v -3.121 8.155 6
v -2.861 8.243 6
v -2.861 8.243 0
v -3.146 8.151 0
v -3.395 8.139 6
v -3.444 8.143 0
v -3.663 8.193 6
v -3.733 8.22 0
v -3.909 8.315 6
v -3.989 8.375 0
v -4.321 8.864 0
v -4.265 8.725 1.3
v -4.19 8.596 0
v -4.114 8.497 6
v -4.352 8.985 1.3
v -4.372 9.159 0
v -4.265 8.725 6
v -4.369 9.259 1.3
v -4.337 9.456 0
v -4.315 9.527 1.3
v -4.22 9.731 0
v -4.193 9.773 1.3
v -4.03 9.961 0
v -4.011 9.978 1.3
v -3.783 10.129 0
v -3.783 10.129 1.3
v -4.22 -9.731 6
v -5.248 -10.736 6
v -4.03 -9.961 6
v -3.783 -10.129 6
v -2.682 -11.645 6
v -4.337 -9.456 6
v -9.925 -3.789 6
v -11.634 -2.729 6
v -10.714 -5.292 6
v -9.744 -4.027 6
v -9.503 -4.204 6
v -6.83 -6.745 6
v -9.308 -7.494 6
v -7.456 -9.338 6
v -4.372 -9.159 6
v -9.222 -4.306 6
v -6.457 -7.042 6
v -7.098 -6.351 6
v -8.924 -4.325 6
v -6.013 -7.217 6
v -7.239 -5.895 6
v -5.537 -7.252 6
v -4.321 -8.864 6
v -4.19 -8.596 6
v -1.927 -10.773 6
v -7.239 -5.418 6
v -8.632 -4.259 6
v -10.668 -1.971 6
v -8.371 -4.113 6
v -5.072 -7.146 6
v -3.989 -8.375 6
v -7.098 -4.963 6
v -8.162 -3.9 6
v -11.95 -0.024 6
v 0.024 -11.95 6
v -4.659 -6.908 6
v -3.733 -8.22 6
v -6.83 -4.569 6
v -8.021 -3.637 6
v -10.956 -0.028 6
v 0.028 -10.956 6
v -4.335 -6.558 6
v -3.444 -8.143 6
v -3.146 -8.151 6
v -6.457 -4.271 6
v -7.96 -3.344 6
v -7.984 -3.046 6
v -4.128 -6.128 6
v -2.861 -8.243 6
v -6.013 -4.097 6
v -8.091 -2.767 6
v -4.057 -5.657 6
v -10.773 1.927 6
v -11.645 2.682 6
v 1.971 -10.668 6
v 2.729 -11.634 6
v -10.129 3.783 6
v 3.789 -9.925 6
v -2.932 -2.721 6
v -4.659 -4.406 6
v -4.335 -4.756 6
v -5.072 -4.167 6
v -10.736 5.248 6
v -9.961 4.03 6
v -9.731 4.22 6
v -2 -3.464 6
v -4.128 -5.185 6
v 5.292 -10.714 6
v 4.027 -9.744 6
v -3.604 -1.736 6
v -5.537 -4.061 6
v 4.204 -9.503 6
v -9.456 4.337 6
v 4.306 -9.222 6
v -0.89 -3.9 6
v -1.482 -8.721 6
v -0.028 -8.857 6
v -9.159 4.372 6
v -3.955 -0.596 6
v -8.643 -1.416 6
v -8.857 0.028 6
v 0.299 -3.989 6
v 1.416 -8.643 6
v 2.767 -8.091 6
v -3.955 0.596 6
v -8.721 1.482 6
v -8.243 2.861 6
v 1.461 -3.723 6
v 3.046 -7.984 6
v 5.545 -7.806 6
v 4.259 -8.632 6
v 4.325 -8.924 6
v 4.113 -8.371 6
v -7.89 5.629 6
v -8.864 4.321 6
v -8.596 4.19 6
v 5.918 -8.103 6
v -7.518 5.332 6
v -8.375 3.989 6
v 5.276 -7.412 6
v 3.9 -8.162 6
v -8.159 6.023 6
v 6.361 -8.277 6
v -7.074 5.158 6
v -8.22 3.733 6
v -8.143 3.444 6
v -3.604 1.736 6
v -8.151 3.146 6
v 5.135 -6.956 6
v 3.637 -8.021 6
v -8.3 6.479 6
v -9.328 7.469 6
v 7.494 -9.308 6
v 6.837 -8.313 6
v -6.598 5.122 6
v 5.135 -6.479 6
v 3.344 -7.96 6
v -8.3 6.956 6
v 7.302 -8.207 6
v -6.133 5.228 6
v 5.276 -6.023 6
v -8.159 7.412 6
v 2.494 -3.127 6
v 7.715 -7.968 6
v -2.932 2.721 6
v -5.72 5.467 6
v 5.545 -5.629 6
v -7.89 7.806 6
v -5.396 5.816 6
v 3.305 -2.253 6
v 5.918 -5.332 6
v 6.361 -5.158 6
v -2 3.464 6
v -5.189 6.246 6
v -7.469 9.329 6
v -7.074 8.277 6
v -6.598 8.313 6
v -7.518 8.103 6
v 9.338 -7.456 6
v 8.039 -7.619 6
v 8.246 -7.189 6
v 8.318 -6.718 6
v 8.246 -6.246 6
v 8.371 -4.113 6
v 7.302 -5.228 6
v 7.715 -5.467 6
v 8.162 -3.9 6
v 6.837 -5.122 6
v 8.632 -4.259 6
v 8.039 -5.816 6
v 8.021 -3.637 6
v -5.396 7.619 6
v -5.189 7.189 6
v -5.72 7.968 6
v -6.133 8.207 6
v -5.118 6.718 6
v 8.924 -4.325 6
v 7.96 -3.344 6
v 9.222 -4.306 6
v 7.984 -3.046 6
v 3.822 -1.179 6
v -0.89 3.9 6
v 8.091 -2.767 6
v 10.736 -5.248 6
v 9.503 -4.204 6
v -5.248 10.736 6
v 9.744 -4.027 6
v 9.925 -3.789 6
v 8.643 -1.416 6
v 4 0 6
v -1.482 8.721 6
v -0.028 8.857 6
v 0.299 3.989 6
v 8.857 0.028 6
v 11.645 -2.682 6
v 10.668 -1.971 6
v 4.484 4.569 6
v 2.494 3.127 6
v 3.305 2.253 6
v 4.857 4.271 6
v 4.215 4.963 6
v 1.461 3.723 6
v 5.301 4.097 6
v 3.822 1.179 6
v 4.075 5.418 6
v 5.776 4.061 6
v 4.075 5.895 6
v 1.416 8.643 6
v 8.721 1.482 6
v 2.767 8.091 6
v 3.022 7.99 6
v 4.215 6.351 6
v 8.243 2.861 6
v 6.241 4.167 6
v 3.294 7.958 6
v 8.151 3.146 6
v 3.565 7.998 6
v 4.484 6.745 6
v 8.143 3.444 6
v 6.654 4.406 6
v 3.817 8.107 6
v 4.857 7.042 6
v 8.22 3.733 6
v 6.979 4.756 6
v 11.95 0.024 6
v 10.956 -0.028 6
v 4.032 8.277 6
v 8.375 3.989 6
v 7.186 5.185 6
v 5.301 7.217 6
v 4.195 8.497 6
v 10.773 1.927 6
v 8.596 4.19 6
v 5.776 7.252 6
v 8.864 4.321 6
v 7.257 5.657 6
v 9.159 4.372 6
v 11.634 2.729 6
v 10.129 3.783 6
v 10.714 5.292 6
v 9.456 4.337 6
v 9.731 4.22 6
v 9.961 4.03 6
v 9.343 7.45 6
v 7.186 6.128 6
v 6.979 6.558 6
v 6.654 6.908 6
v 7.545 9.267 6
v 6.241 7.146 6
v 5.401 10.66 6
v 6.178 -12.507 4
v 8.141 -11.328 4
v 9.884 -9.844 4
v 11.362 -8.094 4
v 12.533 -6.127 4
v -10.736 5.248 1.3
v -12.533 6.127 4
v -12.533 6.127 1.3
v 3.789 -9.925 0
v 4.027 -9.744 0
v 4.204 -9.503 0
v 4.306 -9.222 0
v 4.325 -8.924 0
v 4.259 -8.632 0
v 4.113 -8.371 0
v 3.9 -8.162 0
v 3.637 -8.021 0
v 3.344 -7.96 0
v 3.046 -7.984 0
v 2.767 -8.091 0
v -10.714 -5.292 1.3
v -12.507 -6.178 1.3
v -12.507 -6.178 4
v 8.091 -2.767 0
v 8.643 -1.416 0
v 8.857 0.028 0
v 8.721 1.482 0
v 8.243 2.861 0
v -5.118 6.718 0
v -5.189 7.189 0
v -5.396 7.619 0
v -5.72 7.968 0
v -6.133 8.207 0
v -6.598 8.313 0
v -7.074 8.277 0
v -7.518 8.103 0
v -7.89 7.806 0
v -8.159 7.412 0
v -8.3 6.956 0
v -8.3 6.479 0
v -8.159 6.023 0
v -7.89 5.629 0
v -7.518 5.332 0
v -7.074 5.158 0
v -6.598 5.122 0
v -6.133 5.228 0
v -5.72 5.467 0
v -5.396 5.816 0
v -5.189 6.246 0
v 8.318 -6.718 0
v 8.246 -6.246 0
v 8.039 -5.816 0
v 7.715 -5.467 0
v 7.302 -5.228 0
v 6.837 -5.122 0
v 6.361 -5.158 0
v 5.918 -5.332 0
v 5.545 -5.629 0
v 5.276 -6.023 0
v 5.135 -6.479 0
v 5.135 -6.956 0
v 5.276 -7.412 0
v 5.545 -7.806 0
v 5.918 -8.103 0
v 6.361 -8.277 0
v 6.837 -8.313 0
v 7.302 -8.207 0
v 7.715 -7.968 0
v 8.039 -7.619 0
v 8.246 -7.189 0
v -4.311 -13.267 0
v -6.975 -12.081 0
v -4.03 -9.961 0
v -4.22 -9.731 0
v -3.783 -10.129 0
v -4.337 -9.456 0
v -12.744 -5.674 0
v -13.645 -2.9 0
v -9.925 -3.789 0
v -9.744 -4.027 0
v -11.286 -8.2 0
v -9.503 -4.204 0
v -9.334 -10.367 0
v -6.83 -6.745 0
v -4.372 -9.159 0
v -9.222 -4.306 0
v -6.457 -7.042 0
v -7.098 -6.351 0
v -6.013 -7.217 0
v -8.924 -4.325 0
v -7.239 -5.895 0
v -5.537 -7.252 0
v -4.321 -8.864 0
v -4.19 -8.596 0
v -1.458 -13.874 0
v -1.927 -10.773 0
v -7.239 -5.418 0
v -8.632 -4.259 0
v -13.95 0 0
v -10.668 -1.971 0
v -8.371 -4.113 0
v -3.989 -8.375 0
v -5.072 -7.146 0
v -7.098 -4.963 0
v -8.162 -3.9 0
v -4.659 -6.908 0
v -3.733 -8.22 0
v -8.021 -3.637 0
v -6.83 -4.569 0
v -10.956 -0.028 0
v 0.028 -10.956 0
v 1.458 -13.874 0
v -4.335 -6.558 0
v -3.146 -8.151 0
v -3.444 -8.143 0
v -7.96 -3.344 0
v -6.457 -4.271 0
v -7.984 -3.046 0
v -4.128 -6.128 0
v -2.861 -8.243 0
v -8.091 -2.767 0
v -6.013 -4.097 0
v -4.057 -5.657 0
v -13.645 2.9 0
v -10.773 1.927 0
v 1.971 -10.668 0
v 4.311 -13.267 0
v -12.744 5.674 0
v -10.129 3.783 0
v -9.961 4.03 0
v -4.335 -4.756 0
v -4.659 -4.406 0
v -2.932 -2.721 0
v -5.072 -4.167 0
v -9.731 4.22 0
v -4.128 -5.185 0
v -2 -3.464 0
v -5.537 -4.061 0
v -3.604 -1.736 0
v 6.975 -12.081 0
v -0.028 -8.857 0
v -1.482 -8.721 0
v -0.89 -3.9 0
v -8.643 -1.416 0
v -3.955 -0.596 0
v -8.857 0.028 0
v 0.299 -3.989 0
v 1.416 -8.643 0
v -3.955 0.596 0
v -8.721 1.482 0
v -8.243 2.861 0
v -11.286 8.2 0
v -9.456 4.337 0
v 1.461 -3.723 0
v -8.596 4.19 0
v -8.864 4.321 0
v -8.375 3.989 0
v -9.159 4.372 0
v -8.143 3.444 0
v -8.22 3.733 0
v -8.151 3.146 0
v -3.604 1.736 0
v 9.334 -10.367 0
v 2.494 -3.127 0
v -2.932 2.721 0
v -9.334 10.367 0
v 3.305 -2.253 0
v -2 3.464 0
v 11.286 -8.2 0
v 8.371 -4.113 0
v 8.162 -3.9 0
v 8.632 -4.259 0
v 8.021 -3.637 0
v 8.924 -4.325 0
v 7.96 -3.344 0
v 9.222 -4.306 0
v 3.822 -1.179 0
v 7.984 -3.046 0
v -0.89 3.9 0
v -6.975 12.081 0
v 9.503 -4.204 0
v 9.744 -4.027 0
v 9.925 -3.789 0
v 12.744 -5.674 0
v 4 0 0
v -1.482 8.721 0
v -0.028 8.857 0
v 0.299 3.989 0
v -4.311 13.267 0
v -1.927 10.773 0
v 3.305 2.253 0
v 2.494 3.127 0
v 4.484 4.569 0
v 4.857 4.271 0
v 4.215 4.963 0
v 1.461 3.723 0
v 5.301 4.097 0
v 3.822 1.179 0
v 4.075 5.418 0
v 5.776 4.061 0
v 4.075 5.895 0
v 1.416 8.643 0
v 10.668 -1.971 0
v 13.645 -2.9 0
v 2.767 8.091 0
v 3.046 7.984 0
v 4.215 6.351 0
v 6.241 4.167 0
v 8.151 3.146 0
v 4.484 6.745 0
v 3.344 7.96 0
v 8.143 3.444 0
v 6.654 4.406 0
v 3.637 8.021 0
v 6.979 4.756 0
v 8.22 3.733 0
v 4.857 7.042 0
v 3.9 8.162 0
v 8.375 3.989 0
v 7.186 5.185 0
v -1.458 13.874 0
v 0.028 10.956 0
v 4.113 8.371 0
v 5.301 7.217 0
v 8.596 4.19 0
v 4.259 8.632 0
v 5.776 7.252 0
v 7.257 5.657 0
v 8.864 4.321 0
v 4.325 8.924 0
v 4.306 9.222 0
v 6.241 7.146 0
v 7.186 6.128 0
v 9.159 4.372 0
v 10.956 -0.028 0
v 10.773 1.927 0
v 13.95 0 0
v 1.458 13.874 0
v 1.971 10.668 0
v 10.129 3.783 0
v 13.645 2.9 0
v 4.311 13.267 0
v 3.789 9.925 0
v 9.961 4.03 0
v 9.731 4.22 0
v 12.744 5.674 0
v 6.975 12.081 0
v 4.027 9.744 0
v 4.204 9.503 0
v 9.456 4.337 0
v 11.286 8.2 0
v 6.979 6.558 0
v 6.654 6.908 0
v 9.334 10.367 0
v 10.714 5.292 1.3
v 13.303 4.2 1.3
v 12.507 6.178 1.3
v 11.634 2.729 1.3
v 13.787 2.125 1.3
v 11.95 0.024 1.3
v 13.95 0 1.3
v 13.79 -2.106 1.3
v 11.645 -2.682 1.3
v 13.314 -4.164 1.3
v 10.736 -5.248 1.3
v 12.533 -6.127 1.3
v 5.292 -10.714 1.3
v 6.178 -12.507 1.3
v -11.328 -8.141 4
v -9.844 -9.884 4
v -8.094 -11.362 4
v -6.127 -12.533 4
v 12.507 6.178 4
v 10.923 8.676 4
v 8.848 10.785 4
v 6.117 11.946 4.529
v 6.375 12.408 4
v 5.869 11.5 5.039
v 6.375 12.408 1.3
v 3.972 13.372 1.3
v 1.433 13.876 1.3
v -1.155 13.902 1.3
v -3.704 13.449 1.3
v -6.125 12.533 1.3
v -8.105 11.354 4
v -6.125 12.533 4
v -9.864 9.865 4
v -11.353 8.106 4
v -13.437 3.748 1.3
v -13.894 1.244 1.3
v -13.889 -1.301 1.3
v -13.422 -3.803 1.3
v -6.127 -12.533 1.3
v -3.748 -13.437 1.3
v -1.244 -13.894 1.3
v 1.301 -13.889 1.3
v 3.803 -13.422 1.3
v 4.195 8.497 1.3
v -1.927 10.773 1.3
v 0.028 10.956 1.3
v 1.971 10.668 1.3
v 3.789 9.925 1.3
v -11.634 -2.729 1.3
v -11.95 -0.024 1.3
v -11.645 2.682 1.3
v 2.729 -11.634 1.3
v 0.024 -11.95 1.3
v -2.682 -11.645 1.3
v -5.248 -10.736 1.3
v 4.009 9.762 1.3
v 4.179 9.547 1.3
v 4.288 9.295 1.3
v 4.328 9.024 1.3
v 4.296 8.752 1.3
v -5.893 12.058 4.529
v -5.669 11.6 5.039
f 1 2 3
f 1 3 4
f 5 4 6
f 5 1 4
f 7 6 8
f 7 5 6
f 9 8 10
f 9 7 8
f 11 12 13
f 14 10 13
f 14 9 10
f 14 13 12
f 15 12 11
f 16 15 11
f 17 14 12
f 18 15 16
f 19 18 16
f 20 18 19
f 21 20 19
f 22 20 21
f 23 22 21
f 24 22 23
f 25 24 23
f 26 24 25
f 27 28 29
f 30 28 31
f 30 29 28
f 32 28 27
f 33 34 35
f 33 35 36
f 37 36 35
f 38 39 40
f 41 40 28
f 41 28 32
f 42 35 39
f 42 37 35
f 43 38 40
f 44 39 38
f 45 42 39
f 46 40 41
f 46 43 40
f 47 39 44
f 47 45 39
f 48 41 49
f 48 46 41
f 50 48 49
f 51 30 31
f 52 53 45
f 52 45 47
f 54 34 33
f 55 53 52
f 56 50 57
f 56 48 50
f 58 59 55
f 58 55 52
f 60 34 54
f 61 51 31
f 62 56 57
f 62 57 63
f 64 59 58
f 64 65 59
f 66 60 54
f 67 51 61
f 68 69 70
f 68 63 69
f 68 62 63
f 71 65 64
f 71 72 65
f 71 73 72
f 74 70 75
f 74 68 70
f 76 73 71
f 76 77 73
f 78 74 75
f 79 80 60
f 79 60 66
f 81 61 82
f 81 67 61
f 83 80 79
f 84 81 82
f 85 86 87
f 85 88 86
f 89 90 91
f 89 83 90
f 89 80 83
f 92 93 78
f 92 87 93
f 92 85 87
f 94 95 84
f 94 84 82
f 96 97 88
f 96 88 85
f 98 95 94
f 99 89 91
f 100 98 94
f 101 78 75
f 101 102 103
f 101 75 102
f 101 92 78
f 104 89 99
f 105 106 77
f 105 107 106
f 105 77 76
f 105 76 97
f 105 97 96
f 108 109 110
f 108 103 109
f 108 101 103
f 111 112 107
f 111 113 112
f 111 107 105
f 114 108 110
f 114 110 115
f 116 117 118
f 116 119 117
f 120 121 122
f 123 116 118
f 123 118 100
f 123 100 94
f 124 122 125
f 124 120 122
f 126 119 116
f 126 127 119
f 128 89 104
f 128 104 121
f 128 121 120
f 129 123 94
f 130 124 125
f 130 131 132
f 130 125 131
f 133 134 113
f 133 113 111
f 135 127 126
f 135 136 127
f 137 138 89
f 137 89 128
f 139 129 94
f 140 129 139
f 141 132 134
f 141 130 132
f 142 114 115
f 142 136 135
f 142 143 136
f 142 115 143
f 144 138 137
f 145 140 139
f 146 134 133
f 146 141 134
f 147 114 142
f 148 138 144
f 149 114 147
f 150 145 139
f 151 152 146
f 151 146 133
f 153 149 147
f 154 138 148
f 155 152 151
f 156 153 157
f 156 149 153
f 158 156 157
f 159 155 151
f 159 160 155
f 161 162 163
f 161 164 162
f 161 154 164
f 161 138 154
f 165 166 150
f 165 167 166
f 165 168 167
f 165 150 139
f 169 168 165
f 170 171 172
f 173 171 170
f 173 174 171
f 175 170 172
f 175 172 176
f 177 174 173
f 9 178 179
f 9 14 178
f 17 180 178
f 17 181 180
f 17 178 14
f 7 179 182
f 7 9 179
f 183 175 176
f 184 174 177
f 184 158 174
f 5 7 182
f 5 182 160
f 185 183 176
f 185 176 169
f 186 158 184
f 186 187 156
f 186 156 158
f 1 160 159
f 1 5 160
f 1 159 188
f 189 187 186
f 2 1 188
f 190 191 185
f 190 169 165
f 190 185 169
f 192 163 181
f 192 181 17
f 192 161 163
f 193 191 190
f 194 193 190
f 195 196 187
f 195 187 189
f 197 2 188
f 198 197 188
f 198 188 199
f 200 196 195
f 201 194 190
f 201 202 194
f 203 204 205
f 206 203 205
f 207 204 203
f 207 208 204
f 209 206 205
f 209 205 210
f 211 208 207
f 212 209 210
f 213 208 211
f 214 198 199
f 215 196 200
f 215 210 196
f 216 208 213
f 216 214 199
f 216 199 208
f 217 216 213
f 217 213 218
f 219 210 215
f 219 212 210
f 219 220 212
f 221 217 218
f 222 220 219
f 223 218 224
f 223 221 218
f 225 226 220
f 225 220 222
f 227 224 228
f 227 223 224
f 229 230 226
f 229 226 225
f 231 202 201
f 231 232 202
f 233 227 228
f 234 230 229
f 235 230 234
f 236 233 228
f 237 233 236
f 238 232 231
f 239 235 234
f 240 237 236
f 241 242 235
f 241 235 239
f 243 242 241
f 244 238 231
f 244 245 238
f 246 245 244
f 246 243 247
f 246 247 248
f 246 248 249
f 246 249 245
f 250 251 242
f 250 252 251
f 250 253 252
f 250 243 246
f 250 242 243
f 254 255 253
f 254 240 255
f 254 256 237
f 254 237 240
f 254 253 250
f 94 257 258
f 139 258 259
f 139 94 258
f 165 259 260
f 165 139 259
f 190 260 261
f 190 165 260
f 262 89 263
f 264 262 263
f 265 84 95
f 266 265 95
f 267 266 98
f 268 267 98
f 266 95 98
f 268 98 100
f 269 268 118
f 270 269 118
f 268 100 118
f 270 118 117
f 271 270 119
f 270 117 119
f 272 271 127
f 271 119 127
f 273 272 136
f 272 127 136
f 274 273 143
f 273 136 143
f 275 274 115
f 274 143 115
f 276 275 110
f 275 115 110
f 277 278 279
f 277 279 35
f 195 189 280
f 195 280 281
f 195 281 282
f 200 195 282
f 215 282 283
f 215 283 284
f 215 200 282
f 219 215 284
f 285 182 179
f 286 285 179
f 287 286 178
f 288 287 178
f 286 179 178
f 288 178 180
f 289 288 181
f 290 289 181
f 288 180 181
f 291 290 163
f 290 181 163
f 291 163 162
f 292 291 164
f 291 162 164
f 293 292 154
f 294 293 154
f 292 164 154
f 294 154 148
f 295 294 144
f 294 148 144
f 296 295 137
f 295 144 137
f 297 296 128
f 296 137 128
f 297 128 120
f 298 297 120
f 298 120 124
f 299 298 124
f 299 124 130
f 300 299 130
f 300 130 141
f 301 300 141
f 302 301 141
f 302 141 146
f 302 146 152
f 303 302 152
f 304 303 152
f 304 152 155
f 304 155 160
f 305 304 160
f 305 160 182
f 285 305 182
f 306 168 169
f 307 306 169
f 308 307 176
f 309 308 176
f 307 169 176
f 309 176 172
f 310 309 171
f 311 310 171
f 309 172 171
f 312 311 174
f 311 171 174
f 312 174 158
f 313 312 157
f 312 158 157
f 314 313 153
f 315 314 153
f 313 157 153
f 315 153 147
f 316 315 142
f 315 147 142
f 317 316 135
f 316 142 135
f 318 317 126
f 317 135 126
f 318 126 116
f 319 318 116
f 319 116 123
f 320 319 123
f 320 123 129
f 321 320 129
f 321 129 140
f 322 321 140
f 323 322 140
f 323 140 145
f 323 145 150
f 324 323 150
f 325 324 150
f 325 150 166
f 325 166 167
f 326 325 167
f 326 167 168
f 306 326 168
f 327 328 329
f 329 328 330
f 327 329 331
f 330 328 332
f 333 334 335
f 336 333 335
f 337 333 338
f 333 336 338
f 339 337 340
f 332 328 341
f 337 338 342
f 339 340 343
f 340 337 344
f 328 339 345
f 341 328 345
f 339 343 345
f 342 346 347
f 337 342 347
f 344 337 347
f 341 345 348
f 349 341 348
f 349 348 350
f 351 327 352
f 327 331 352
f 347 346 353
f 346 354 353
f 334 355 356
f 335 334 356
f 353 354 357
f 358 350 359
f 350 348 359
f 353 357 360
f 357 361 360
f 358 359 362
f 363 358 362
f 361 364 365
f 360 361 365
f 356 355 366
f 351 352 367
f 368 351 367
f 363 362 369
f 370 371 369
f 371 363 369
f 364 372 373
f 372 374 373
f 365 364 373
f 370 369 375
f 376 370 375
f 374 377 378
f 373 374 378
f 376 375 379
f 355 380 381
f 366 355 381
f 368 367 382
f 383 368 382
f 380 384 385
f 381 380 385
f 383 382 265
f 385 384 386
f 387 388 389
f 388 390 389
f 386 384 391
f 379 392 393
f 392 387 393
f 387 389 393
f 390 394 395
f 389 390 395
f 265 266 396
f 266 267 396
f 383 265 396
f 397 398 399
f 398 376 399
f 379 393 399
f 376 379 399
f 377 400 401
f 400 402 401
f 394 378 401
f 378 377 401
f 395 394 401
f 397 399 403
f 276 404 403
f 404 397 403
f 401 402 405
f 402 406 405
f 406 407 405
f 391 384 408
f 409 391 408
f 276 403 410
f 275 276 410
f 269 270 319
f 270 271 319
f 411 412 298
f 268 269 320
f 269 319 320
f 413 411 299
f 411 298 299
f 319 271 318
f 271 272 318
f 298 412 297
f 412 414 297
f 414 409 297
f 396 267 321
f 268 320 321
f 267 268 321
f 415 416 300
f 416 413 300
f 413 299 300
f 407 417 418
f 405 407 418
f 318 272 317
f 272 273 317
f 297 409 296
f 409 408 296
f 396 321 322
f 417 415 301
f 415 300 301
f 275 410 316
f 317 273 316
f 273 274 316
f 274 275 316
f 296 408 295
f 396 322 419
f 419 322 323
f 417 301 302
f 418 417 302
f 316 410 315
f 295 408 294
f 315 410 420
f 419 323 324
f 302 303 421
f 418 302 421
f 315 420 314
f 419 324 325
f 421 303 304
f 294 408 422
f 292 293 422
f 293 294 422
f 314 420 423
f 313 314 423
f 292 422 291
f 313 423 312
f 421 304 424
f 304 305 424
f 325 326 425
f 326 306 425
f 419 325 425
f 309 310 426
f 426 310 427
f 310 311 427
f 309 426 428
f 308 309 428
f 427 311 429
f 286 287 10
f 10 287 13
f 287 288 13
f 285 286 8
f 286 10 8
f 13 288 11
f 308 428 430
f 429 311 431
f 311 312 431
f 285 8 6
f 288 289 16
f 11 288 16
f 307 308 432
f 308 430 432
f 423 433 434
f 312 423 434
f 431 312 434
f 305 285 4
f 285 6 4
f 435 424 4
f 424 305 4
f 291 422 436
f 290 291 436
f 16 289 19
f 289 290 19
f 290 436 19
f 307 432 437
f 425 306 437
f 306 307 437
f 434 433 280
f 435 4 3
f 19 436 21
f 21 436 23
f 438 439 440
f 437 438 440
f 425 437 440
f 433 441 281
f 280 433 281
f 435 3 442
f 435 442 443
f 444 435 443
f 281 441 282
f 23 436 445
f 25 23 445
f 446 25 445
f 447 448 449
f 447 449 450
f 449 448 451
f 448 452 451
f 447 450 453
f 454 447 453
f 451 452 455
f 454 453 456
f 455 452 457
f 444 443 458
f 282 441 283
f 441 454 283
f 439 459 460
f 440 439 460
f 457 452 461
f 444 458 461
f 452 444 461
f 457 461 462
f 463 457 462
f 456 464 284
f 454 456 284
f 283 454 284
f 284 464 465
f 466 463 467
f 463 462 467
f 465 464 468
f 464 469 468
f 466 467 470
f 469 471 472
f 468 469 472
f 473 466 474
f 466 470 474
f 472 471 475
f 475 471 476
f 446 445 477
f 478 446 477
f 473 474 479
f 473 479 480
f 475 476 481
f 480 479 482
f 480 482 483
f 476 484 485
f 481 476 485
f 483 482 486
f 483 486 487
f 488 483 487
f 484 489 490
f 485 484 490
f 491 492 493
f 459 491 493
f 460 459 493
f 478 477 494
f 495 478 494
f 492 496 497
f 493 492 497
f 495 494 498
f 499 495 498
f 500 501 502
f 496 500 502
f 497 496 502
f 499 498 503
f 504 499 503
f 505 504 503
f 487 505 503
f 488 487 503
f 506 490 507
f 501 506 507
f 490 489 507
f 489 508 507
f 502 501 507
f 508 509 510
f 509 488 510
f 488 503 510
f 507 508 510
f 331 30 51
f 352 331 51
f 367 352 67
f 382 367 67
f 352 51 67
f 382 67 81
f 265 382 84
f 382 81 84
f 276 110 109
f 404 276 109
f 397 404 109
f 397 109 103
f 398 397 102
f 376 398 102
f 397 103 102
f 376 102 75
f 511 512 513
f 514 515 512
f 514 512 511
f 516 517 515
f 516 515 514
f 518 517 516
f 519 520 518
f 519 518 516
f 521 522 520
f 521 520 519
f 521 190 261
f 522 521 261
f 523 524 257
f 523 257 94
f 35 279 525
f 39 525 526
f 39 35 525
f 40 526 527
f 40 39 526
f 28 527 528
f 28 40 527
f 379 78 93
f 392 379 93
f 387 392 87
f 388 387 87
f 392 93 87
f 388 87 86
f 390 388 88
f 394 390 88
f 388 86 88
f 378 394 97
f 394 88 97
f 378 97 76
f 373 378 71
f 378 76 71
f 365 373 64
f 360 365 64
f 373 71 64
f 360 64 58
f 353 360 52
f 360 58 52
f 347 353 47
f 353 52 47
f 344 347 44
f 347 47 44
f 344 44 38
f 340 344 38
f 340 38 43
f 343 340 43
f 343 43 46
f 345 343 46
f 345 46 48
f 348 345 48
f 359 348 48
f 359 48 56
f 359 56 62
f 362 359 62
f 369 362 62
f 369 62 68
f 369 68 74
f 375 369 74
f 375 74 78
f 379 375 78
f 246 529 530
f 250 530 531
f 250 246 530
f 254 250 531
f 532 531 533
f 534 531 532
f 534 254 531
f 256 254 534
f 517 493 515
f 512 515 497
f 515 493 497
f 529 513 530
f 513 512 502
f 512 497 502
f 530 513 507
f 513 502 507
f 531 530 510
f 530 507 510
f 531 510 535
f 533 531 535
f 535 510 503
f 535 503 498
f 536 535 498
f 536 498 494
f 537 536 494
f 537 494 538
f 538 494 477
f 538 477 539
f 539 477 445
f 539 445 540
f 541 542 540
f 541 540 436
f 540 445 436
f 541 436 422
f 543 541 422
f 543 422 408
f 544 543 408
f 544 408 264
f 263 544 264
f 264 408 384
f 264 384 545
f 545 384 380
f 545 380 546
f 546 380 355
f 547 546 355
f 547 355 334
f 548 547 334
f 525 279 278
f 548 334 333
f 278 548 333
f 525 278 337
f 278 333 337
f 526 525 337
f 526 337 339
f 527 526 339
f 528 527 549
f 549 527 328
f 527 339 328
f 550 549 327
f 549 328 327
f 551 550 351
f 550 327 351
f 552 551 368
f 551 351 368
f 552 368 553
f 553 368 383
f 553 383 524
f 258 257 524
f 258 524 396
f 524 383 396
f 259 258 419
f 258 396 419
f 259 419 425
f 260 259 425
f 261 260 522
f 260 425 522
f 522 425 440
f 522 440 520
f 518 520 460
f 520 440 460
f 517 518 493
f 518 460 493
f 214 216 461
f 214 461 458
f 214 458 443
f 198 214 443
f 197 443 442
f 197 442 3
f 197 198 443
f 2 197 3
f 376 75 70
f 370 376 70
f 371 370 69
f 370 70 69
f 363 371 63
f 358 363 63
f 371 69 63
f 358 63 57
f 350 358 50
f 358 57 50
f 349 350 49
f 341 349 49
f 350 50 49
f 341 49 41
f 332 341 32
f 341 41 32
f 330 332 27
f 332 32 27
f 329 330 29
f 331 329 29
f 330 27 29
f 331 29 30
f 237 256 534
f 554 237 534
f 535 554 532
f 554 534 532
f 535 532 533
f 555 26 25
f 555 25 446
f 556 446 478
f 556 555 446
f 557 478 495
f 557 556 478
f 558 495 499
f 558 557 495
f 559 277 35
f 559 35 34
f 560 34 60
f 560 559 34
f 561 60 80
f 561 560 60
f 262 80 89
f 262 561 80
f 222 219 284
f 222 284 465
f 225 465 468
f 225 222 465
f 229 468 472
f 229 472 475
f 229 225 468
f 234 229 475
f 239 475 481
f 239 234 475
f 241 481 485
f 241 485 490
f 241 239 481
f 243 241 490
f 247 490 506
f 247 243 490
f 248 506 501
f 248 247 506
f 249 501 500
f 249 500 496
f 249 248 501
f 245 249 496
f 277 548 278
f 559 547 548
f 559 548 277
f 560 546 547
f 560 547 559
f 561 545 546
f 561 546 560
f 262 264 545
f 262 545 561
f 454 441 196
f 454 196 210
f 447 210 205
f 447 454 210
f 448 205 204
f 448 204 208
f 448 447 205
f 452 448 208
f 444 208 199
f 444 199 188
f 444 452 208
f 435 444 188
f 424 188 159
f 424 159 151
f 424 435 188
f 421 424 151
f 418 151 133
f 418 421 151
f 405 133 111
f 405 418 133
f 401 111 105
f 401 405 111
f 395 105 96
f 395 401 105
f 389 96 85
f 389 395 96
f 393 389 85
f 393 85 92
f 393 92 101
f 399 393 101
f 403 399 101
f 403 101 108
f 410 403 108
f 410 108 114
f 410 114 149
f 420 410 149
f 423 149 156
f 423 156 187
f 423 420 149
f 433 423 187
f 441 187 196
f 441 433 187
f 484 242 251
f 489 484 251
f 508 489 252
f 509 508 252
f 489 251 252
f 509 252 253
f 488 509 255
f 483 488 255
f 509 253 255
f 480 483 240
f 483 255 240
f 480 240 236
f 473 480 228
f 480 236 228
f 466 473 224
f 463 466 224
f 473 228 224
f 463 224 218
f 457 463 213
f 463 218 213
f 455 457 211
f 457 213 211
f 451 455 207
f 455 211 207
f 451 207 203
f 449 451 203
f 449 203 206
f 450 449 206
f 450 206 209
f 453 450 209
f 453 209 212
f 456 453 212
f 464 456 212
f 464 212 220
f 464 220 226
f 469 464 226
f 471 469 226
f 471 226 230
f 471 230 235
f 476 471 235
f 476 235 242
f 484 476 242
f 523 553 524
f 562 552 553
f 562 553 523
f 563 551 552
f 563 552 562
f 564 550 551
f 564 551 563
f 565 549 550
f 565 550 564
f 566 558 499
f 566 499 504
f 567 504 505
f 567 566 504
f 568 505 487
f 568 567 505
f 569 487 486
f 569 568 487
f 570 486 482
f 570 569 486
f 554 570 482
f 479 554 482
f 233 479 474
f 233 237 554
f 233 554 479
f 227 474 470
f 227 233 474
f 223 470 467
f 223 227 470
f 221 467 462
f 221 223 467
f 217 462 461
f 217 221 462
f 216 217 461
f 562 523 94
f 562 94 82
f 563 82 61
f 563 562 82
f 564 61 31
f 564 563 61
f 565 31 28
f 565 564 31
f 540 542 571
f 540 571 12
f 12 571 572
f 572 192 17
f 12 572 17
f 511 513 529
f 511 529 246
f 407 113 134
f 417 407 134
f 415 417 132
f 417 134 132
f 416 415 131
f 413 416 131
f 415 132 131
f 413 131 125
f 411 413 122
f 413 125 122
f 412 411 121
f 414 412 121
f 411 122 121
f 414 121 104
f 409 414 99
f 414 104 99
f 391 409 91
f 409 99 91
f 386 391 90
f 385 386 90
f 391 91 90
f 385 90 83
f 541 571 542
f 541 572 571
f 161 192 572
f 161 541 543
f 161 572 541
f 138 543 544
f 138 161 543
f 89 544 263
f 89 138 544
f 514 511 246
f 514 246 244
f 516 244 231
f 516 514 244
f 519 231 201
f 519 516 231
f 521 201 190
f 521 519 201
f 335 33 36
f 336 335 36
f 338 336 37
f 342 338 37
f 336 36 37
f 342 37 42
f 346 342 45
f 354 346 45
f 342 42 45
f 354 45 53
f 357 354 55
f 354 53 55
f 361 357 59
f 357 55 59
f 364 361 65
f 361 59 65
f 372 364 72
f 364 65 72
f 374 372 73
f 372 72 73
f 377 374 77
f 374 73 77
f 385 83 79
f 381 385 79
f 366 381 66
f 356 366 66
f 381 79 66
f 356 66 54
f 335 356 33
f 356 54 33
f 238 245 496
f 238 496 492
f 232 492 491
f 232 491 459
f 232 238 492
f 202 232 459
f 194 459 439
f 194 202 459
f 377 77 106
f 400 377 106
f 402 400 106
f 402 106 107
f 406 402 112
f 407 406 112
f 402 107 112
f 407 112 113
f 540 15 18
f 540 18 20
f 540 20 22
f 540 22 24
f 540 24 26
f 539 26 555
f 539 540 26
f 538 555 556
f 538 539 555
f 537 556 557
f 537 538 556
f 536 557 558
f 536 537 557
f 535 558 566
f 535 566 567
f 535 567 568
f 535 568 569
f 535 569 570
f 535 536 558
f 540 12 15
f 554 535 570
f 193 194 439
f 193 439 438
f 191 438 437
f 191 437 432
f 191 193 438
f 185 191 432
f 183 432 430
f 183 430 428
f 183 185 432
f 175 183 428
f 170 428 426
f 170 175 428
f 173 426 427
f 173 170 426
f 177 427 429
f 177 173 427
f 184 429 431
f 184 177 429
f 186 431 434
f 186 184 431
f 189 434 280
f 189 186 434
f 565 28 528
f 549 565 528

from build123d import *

# Parameters (mm, degrees)
IZIM1_R                     = 13.95
IZIM1_R_2                   = 4
Y_KSEKLIK_EKSTR_ZYON3_DEPTH = 6
M3_BO_LUKLU_DELIK3_D        = 3.2
KES_EKSTR_ZYON2_DEPTH       = 6
DAIRESEL_KAPLAMA1_COUNT     = 2
DAIRESEL_KAPLAMA1_ANGLE     = 90
KES_EKSTR_ZYON11_DEPTH      = 4.7
PAH1_SIZE                   = 2
KES_EKSTR_ZYON12_START      = -4.7
KES_EKSTR_ZYON12_DEPTH      = 4.7
DAIRESEL_KAPLAMA2_COUNT     = 3
DAIRESEL_KAPLAMA2_ANGLE     = 180


with BuildPart() as part:
    # Çizim1 → Yükseklik-Ekstrüzyon3 (new body)
    with BuildSketch(Plane.XY):
        Circle(IZIM1_R)
        Circle(IZIM1_R_2, mode=Mode.SUBTRACT)
    extrude(amount=Y_KSEKLIK_EKSTR_ZYON3_DEPTH)

    # M3 Boşluklu Delik3 (through all)
    with Locations(Plane(origin=(0, 0, 0), x_dir=(-1, 0, 0), z_dir=(0, 0, -1))):
        with Locations((-5.656854249, 5.656854249), (-6.717514421, -6.717514421), (5.656854249, -5.656854249), (6.717514421, 6.717514421)):
            Hole(M3_BO_LUKLU_DELIK3_D / 2)

    # Çizim13 → Kes-Ekstrüzyon2 (cut)
    with BuildSketch(Plane.XY.offset(6)):
        with BuildLine():
            ThreePointArc((-10.129468154, 3.782692346), (-10.95644466, -0.028335886), (-9.925054528, -3.789194927))
            ThreePointArc((-9.925054528, -3.789194927), (-8.496760909, -4.195368951), (-8.090586885, -2.767075332))
            ThreePointArc((-8.090586885, -2.767075332), (-8.857209488, 0.028335886), (-8.242525614, 2.861037394))
            ThreePointArc((-8.242525614, 2.861037394), (-8.725169408, 4.26533614), (-10.129468154, 3.782692346))
        make_face()
        with BuildLine():
            ThreePointArc((10.129468154, 3.782692346), (10.95644466, -0.028335886), (9.925054528, -3.789194927))
            ThreePointArc((9.925054528, -3.789194927), (8.496760909, -4.195368951), (8.090586885, -2.767075332))
            ThreePointArc((8.090586885, -2.767075332), (8.857209488, 0.028335886), (8.242525614, 2.861037394))
            ThreePointArc((8.242525614, 2.861037394), (8.725169408, 4.26533614), (10.129468154, 3.782692346))
        make_face()
    kes_ekstr_zyon2 = extrude(amount=-KES_EKSTR_ZYON2_DEPTH, mode=Mode.SUBTRACT)

    # Dairesel Kaplama1: Kes-Ekstrüzyon2 ×2 about axis
    dairesel_kaplama1_axis = Axis((0, 0, 0), (0, 0, 1))
    for i in range(1, DAIRESEL_KAPLAMA1_COUNT):
        add(kes_ekstr_zyon2.rotate(dairesel_kaplama1_axis, i * DAIRESEL_KAPLAMA1_ANGLE / (DAIRESEL_KAPLAMA1_COUNT - 1)), mode=Mode.SUBTRACT)

    # Çizim16 → Kes-Ekstrüzyon11 (cut)
    with BuildSketch(Plane.XY.offset(6)):
        with BuildLine():
            Line((-6.125352388, 12.533258081), (-4.26533614, 8.725169408))
            ThreePointArc((-4.26533614, 8.725169408), (-4.314854036, 9.527277584), (-3.782692346, 10.129468154))
            ThreePointArc((-3.782692346, 10.129468154), (0.028335886, 10.95644466), (3.789194927, 9.925054528))
            ThreePointArc((3.789194927, 9.925054528), (4.288091233, 9.295029113), (4.195368951, 8.496760909))
            Line((4.195368951, 8.496760909), (6.374759269, 12.408261129))
            ThreePointArc((6.374759269, 12.408261129), (0.139488378, 13.949302599), (-6.125352388, 12.533258081))
        make_face()
    extrude(amount=-KES_EKSTR_ZYON11_DEPTH, mode=Mode.SUBTRACT)

    # Pah1
    pah1_edges = [part.edges().sort_by_distance(p)[0] for p in [
        (-7.387619176, -11.833240592, 6),
    ]]
    chamfer(pah1_edges, length=PAH1_SIZE)

    # Çizim18 → Kes-Ekstrüzyon12 (cut)
    with BuildSketch(Plane.XY.offset(6).offset(KES_EKSTR_ZYON12_START)):
        with BuildLine():
            Line((-10.735839815, 5.248260994), (-12.53263309, 6.126631034))
            ThreePointArc((-12.53263309, 6.126631034), (-13.94997085, -0.028518286), (-12.50747878, -6.177821183))
            Line((-12.50747878, -6.177821183), (-10.714291858, -5.292112053))
            ThreePointArc((-10.714291858, -5.292112053), (-11.949975029, -0.024429643), (-10.735839815, 5.248260994))
        make_face()
    kes_ekstr_zyon12 = extrude(amount=KES_EKSTR_ZYON12_DEPTH, mode=Mode.SUBTRACT)

    # Dairesel Kaplama2: Kes-Ekstrüzyon12 ×3 about axis
    dairesel_kaplama2_axis = Axis((0, 0, 6), (0, 0, 1))
    for i in range(1, DAIRESEL_KAPLAMA2_COUNT):
        add(kes_ekstr_zyon12.rotate(dairesel_kaplama2_axis, i * DAIRESEL_KAPLAMA2_ANGLE / (DAIRESEL_KAPLAMA2_COUNT - 1)), mode=Mode.SUBTRACT)


solid = part.part
